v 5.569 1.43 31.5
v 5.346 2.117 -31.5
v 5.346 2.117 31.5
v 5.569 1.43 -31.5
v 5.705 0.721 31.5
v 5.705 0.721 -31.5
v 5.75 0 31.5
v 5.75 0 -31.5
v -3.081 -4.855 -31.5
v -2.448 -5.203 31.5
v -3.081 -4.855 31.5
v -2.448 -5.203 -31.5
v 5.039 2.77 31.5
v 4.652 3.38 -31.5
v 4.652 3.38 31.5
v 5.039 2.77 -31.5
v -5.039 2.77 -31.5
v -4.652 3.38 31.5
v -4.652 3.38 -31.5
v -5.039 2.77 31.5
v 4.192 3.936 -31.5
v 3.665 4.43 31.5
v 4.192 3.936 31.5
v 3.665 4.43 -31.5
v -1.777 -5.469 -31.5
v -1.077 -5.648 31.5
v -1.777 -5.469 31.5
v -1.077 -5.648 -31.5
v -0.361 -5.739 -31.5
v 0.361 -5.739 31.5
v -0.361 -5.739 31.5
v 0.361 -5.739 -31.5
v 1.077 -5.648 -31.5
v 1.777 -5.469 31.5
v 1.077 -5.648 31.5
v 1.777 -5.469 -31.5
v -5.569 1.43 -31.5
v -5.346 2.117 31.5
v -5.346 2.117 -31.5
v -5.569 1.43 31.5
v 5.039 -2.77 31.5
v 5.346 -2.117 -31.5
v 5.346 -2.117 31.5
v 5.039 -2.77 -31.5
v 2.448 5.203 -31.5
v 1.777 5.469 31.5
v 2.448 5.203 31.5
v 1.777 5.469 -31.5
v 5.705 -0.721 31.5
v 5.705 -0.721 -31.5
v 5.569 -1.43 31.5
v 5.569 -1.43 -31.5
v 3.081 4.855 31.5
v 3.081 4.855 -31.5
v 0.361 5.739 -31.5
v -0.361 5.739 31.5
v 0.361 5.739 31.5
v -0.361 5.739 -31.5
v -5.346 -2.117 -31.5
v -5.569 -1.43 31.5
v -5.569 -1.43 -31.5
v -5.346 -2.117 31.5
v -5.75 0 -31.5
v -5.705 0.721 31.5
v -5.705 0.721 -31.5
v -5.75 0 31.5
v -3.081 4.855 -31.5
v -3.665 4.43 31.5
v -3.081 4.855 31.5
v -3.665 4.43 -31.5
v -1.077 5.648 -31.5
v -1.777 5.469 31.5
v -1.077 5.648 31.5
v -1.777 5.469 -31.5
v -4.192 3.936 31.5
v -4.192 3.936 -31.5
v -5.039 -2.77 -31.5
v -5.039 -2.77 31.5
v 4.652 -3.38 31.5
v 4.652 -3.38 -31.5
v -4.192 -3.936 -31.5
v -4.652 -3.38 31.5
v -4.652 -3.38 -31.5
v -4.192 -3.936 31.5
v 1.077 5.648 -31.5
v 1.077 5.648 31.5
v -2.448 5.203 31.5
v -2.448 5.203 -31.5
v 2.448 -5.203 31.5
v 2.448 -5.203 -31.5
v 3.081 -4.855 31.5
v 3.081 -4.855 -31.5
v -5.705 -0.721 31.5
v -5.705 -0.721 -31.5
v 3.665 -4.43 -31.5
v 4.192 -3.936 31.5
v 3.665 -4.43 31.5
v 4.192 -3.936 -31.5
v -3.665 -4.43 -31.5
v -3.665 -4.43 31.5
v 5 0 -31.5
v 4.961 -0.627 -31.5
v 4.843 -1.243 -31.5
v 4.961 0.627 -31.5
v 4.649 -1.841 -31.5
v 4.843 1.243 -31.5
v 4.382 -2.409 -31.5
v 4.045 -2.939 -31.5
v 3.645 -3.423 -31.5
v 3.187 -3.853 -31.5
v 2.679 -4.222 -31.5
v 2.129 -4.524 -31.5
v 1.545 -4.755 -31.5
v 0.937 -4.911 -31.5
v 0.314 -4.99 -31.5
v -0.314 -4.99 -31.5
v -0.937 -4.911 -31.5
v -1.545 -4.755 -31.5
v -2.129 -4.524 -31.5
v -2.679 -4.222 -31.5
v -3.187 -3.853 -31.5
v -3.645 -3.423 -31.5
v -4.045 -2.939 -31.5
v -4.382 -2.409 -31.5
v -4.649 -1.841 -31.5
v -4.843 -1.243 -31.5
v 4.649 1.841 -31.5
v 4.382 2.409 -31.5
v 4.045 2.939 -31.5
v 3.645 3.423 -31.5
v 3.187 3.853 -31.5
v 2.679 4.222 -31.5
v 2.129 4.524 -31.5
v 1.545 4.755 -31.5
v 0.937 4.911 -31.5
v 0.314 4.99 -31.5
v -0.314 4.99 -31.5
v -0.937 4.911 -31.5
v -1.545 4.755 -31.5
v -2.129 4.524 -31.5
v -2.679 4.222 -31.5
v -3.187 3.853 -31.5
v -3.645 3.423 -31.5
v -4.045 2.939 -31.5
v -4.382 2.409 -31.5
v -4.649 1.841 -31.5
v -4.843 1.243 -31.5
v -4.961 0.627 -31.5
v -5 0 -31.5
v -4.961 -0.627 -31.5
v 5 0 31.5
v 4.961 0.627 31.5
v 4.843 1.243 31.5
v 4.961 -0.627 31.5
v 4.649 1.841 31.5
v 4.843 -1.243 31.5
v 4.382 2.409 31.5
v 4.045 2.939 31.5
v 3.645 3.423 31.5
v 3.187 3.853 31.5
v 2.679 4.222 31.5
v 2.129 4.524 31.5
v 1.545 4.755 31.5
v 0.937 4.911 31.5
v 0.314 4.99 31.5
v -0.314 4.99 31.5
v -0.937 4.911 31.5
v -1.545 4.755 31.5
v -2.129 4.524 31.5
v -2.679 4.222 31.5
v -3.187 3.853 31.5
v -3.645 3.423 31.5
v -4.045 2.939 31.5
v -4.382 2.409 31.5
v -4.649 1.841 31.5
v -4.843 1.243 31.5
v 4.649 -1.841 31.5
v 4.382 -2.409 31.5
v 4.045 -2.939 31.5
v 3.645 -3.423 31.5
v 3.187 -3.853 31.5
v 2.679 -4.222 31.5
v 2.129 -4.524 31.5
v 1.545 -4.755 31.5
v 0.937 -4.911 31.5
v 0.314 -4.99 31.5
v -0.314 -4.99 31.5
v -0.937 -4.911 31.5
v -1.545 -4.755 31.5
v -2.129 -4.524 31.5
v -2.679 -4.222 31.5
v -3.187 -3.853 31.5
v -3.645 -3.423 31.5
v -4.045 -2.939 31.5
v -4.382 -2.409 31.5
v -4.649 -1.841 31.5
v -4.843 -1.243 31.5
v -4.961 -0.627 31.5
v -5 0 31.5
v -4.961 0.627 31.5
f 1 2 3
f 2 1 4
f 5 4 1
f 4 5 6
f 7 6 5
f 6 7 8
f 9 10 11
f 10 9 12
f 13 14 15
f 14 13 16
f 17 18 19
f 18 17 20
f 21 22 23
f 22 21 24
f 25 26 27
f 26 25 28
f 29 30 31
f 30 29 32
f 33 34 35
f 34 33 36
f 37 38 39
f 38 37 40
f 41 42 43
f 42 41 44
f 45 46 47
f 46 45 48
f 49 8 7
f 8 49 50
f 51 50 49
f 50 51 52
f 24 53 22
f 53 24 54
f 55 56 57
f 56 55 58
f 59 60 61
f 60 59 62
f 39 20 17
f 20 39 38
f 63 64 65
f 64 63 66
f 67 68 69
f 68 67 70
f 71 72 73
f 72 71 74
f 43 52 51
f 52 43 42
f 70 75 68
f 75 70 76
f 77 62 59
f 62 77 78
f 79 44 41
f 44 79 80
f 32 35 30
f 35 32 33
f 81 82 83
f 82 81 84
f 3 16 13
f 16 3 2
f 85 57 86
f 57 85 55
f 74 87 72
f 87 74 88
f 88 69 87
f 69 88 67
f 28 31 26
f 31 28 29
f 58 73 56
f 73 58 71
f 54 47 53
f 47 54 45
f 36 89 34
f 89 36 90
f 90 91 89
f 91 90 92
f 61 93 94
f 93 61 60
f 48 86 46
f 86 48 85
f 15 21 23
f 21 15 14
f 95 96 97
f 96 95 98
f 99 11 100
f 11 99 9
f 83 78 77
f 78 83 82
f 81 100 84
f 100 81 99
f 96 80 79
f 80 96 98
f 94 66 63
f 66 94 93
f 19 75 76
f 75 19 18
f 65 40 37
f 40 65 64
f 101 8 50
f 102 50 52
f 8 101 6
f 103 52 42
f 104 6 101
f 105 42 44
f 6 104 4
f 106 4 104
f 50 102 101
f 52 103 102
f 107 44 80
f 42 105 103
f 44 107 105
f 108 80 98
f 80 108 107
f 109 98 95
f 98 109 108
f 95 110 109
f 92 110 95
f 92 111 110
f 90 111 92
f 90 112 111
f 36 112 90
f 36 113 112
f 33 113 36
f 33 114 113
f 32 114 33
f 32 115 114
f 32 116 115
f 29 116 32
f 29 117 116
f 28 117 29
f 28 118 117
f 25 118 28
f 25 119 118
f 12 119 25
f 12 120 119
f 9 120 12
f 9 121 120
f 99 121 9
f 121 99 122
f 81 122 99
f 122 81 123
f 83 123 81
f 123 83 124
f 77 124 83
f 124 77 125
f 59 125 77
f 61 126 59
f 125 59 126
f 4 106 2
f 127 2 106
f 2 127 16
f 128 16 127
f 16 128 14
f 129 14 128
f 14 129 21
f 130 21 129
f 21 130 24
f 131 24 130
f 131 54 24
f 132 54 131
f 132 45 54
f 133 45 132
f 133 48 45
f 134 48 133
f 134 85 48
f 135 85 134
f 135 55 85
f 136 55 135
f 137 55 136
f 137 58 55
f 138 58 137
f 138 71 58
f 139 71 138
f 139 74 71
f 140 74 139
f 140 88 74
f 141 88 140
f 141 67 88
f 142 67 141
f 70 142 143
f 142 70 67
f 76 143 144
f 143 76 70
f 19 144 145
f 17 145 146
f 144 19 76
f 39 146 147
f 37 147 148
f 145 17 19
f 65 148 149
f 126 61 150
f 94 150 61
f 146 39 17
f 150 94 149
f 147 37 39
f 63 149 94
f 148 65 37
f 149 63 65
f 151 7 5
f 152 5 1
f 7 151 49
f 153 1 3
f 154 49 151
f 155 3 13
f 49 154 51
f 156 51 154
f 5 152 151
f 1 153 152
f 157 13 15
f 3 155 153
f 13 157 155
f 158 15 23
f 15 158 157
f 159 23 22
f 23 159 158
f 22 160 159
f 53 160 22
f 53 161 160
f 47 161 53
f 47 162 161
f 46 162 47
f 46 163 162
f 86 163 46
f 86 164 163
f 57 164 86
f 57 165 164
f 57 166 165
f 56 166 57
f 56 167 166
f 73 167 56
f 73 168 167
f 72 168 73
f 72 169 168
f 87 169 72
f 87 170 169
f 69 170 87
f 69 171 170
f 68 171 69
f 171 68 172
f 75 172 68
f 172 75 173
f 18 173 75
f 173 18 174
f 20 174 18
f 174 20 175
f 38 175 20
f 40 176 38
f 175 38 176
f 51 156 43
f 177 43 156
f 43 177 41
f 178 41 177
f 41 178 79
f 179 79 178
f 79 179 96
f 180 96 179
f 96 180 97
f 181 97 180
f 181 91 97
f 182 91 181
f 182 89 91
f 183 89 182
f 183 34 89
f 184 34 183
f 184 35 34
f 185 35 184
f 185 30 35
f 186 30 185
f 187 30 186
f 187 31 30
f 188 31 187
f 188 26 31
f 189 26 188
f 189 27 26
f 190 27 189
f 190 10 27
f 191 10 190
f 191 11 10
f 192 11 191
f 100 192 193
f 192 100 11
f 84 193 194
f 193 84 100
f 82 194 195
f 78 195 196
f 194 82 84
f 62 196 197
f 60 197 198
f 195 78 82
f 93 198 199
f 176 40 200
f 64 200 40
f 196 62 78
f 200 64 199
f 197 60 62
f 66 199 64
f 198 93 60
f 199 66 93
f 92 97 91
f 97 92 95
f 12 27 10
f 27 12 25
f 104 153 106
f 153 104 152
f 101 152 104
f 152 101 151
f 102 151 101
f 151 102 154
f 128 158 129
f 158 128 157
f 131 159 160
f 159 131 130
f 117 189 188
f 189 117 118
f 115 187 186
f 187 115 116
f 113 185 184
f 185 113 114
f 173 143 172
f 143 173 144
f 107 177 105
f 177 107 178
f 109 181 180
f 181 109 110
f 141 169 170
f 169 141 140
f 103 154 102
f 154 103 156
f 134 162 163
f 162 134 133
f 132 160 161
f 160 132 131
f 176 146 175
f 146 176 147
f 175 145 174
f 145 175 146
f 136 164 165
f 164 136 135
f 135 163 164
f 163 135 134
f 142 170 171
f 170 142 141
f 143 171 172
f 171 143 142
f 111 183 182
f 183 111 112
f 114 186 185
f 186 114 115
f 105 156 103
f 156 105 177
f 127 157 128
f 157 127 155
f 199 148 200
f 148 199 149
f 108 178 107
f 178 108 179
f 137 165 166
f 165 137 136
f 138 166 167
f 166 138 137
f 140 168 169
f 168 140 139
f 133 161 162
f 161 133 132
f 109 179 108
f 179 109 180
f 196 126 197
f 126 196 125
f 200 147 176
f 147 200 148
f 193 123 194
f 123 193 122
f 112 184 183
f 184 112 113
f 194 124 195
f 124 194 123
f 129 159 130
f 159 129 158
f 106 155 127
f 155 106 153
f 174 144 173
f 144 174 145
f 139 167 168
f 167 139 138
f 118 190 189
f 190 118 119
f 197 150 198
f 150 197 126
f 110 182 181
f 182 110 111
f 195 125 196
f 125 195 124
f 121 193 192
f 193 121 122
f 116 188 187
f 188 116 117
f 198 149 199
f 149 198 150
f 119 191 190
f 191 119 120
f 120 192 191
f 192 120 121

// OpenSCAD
$fn = 50;


difference() {
	union() {
		translate(v = [0, 0, -31.5000000000]) {
			cylinder(h = 63, r = 5.7500000000);
		}
	}
	union() {
		translate(v = [0, 0, -100.0000000000]) {
			cylinder(h = 200, r = 5.0000000000);
		}
	}
}
